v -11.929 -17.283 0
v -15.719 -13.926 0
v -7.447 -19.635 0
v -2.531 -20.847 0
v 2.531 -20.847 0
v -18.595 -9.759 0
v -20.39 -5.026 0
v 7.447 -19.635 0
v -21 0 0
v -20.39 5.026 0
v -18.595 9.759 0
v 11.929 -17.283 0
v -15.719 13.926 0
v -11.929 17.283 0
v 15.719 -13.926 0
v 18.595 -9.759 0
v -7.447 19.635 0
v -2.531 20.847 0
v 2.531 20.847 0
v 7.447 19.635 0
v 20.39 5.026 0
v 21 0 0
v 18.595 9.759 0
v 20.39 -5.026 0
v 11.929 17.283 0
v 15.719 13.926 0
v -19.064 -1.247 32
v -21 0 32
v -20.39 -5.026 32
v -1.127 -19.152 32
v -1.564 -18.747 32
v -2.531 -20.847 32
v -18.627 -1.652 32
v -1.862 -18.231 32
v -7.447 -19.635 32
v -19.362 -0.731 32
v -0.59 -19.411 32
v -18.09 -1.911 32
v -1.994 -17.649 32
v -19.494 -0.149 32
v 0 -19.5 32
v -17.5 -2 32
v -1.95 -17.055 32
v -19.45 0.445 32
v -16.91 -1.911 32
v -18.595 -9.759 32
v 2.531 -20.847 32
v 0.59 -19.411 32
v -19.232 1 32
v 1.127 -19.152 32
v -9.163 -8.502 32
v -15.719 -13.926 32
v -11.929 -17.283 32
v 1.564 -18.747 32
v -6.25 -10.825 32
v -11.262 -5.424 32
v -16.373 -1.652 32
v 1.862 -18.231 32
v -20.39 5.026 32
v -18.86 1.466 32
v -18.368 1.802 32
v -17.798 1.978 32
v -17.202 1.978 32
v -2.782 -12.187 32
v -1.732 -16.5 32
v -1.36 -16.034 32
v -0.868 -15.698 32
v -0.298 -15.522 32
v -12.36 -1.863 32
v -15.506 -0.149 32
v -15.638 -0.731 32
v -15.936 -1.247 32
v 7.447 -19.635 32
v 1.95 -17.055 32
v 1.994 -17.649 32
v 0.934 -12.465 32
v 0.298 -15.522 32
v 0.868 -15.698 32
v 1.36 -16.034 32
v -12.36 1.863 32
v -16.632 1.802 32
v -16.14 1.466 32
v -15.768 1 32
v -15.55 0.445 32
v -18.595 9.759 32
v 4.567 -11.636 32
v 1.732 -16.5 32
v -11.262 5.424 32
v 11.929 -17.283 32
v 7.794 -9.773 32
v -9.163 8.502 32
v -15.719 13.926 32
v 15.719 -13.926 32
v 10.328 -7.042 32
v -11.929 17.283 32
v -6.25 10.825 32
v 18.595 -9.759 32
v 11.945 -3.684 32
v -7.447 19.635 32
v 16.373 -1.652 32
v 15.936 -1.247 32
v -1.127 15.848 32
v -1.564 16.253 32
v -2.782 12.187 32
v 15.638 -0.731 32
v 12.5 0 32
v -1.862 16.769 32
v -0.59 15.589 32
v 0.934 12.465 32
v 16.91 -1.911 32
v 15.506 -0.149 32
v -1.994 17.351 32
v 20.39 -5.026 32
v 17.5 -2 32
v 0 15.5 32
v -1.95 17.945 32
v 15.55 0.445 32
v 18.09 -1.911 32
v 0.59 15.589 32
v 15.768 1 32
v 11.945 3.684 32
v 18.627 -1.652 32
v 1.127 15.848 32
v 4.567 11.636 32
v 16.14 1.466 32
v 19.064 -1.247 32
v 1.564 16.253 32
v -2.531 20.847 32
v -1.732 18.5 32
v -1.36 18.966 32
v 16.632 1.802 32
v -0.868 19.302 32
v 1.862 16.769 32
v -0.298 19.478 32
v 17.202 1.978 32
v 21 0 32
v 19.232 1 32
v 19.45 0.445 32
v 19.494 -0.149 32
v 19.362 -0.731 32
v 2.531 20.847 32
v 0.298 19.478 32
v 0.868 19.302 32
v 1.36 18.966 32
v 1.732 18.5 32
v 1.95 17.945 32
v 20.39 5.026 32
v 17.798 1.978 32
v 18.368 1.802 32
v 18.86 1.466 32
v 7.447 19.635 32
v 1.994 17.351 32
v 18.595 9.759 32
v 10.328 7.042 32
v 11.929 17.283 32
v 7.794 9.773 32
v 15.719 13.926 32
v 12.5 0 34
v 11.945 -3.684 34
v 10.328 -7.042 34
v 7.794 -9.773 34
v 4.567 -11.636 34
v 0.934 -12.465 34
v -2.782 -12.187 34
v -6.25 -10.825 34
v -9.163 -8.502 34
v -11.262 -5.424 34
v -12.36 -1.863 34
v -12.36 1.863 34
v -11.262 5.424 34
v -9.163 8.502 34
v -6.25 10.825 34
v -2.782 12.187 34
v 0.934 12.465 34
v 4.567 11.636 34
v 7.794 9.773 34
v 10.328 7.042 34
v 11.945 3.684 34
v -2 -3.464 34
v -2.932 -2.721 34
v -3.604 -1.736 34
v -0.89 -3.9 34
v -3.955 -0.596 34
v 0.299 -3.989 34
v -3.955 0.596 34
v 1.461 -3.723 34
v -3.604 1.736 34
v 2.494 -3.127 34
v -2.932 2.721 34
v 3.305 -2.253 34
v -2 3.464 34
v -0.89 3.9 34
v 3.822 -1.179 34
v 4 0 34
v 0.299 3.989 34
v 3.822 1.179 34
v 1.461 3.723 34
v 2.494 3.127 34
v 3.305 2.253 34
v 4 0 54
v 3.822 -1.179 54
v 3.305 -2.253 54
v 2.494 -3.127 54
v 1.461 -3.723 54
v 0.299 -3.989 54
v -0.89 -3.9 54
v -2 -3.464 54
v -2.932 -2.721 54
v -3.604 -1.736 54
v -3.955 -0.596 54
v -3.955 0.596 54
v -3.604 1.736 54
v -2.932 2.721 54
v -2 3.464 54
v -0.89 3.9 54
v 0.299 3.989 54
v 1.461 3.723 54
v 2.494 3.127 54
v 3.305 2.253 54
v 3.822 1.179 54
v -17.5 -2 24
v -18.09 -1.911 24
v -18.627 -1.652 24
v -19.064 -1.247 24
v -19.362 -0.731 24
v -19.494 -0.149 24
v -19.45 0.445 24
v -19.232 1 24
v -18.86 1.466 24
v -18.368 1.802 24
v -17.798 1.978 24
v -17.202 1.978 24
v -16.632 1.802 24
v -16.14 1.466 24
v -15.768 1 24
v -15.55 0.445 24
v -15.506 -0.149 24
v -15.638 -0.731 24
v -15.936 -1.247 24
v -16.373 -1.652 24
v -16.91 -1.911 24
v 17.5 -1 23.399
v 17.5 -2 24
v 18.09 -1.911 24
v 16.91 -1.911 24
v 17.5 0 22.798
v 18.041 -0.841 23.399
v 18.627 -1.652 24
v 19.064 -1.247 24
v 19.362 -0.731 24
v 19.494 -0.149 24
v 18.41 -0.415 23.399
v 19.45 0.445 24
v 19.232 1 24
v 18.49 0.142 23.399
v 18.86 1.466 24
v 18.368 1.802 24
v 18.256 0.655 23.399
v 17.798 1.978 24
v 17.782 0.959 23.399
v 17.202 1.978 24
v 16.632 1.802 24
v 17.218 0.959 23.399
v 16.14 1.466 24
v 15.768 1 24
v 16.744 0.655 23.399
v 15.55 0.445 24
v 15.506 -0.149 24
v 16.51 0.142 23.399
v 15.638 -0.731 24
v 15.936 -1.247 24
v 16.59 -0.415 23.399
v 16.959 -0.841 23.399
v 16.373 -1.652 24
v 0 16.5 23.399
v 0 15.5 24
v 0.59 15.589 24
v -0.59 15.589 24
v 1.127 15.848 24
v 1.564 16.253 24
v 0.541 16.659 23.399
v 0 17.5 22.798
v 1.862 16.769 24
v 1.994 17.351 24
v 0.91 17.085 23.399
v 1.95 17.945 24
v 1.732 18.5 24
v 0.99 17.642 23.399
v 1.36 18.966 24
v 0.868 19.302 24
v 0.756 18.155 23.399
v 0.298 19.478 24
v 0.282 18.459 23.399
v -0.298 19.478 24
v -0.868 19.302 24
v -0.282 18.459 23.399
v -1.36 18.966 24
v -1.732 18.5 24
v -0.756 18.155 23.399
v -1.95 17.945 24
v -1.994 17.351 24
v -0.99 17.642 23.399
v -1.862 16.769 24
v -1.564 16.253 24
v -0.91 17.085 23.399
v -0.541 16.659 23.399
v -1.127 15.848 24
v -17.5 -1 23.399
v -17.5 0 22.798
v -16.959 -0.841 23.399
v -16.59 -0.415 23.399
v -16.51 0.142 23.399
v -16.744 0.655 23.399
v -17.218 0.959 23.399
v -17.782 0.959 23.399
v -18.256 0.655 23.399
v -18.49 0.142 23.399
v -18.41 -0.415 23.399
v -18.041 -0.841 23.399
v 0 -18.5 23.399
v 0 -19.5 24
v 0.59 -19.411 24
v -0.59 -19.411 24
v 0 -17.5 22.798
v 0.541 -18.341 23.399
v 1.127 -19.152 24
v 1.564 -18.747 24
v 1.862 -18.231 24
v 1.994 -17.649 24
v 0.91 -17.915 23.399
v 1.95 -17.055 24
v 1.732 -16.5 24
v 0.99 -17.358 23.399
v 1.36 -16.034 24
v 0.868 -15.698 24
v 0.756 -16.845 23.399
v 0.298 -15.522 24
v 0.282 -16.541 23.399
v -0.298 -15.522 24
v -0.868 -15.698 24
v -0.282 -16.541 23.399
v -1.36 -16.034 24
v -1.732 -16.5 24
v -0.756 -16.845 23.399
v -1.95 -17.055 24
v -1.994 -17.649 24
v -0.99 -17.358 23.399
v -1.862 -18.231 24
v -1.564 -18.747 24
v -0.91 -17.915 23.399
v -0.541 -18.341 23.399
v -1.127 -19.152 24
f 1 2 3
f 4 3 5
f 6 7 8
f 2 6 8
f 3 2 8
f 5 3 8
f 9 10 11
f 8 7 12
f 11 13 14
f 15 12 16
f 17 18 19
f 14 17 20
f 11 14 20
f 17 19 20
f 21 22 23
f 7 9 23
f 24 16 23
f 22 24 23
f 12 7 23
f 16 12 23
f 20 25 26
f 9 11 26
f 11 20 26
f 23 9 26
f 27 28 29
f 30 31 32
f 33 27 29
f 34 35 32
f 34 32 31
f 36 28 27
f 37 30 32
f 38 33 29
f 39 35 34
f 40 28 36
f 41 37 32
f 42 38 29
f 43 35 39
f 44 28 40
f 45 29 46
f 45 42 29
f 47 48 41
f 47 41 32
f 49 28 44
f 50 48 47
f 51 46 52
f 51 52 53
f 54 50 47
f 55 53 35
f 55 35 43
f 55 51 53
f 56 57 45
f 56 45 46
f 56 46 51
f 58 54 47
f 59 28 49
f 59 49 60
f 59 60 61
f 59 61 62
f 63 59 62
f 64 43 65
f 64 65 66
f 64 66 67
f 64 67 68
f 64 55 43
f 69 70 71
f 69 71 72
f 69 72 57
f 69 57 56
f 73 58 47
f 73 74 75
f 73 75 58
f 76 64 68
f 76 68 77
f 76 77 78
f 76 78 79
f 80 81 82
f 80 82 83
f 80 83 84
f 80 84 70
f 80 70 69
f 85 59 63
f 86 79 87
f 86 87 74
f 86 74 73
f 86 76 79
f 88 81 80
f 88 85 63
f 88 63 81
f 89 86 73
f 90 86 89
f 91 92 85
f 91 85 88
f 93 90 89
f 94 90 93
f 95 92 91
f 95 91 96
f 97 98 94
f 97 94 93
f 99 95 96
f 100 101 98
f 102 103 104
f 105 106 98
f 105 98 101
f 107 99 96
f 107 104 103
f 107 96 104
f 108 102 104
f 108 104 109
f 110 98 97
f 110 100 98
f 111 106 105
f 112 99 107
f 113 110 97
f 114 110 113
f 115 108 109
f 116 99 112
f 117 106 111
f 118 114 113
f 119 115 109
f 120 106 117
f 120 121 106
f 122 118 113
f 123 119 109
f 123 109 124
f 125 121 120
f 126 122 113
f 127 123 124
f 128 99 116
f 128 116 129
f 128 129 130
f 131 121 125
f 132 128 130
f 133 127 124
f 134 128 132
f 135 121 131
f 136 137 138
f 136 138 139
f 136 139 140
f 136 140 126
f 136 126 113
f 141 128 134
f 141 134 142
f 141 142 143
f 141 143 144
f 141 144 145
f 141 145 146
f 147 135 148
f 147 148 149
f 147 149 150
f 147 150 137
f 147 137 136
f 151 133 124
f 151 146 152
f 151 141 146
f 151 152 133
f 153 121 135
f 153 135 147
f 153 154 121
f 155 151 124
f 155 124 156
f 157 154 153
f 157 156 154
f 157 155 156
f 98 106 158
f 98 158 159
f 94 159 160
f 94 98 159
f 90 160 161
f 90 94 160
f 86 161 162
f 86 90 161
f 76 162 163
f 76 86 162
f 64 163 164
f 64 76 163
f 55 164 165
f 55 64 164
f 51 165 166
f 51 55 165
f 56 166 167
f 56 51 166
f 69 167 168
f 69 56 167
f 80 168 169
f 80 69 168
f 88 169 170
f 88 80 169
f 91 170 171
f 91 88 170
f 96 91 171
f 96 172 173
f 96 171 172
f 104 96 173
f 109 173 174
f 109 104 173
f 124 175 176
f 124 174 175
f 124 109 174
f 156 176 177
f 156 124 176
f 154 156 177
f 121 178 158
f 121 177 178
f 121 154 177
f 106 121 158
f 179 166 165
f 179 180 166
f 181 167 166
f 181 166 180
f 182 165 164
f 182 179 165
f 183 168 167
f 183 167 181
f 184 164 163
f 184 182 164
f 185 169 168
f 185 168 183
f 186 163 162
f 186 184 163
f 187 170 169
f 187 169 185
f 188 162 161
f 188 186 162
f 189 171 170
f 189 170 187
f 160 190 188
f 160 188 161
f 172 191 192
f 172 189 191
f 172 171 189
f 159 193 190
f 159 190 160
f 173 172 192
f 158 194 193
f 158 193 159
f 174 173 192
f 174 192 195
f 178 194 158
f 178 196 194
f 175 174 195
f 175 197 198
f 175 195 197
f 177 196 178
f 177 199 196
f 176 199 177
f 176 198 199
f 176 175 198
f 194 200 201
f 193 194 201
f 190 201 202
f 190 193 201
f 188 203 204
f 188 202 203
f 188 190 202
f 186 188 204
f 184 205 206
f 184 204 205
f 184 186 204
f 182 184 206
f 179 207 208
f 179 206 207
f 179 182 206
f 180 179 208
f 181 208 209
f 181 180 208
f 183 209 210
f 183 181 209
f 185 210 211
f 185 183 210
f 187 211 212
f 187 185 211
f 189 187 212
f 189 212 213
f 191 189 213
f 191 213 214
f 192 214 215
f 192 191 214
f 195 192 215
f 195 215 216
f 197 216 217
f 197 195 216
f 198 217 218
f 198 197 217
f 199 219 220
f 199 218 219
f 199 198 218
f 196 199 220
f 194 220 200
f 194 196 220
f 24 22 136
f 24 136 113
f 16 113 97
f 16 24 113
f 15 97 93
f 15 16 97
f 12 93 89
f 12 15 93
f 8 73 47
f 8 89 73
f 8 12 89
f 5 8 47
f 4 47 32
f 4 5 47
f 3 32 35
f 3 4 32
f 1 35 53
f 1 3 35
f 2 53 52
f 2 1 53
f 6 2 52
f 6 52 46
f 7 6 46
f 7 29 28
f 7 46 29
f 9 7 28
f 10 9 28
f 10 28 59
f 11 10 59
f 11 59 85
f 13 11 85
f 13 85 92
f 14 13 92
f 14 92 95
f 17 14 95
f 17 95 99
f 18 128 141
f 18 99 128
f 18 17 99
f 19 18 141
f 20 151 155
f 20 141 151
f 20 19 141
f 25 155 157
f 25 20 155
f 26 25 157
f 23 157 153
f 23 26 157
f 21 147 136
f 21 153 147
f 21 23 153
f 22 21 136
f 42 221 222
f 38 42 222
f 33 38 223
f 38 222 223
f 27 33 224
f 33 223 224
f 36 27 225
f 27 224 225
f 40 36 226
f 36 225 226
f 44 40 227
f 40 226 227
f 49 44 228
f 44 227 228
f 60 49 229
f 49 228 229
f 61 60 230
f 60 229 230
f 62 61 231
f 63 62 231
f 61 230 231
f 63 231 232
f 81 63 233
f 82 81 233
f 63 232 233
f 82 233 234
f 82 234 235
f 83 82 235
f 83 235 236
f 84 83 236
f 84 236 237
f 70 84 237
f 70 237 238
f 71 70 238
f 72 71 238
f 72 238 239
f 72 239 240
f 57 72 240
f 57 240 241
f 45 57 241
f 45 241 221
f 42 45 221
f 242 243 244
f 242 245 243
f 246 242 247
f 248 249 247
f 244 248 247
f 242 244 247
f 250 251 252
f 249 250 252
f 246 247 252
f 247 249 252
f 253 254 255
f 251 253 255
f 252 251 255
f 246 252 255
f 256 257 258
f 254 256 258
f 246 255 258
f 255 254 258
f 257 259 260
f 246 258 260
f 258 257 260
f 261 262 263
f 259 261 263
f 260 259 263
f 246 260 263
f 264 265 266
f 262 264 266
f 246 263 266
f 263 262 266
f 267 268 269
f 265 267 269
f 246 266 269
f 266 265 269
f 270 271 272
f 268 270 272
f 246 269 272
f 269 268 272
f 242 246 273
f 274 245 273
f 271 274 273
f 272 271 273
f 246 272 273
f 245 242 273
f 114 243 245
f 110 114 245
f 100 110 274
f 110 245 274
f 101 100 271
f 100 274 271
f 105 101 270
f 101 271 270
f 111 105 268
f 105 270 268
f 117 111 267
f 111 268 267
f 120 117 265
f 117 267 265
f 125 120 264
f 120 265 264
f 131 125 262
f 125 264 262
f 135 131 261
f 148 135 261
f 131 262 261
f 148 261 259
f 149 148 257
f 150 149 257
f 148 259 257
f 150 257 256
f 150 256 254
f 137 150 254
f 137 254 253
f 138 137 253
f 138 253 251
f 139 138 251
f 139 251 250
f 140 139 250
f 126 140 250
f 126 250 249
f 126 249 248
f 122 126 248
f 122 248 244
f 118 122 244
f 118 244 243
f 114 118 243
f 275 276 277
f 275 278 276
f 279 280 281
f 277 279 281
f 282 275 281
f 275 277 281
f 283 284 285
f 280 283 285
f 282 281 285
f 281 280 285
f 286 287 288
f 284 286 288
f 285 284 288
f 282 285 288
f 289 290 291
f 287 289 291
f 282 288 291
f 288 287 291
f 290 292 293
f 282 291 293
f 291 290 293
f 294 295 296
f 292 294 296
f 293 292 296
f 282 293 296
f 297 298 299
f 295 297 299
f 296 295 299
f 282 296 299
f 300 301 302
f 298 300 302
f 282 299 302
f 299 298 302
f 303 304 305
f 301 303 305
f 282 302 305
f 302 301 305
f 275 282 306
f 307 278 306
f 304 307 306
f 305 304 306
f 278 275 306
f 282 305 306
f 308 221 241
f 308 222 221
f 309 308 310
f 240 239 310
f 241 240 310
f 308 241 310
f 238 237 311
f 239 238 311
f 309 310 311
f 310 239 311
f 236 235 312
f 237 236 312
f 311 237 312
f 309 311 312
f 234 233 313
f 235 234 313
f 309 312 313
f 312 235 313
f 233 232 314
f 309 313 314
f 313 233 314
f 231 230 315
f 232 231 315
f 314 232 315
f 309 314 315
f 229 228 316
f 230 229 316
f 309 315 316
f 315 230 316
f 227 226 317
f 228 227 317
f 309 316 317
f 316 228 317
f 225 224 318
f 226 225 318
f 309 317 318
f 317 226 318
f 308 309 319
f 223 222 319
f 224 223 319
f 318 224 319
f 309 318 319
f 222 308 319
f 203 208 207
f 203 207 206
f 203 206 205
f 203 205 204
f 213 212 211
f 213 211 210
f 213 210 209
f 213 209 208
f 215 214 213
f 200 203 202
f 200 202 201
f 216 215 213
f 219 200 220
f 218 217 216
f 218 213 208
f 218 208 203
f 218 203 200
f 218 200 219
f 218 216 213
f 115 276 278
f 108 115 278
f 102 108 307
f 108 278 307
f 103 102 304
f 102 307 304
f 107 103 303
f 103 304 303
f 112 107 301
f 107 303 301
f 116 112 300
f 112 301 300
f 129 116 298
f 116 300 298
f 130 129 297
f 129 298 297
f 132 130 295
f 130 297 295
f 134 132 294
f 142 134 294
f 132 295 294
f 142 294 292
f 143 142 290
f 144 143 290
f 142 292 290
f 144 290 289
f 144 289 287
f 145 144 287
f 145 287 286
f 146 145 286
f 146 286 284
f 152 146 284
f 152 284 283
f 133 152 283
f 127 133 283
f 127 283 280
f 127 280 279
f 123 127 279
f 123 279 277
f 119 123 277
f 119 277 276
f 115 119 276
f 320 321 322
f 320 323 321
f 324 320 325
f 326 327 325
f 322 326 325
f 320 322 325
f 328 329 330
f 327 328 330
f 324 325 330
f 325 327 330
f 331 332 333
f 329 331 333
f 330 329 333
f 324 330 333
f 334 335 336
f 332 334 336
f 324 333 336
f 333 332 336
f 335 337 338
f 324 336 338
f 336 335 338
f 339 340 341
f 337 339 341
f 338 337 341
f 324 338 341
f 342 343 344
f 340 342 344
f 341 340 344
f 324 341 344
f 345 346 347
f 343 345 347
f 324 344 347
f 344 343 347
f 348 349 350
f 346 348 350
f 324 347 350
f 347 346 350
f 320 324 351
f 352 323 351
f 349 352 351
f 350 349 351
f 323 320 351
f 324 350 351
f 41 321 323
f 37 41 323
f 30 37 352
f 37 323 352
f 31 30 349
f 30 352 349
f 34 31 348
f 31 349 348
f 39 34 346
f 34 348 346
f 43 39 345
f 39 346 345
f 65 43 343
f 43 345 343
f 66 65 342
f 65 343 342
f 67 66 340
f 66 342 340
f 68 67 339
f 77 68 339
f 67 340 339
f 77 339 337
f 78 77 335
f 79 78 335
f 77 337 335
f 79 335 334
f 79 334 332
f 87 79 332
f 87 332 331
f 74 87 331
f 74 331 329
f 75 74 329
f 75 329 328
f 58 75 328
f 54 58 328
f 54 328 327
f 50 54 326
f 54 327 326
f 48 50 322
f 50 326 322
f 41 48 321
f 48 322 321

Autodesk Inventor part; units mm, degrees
ref_plane "YZ Plane" through (0, 0, 0) normal (1, 0, 0) x (0, 1, 0)
ref_plane "XZ Plane" through (0, 0, 0) normal (0, 1, 0) x (-1, 0, 0)
ref_plane "XY Plane" through (0, 0, 0) normal (0, 0, 1) x (1, 0, 0)
sketch "スケッチ1" plane through (0, 0, 0) normal (0, 0, 1) x (1, 0, 0)
  circle A0 centre (0, 0) radius 21
  dimension "d0" = 42
extrude "押し出し1" add sketch "スケッチ1" along normal blind 32
sketch "スケッチ2" plane through (0, 0, 32) normal (0, 0, 1) x (1, 0, 0)
  circle A0 centre (0, 0) radius 12.5
  dimension "d3" = 25
extrude "押し出し2" add sketch "スケッチ2" along normal blind 2
sketch "スケッチ3" plane through (0, 0, 34) normal (0, 0, 1) x (1, 0, 0)
  circle A0 centre (0, 0) radius 4
  dimension "d6" = 8
extrude "押し出し3" add sketch "スケッチ3" along normal blind 20
sketch "スケッチ4" plane through (0, 0, 32) normal (0, 0, 1) x (1, 0, 0)
  point P0 (0, 0)
  point P1 (0, 17.5)
  point P2 (-17.5, 0)
  point P3 (0, -17.5)
  point P4 (17.5, 0)
  dimension "d9" = 17.5
  dimension "d12" = 360
hole "穴1" at (0, 17.5, 32) at (-17.5, 0, 32) at (0, -17.5, 32) at (17.5, 0, 32) direction (0, 0, -1) diameter 4 depth 8 tip angle 118
properties part number "775_gearhead" material "鉄、ねずみ鋳鉄"
